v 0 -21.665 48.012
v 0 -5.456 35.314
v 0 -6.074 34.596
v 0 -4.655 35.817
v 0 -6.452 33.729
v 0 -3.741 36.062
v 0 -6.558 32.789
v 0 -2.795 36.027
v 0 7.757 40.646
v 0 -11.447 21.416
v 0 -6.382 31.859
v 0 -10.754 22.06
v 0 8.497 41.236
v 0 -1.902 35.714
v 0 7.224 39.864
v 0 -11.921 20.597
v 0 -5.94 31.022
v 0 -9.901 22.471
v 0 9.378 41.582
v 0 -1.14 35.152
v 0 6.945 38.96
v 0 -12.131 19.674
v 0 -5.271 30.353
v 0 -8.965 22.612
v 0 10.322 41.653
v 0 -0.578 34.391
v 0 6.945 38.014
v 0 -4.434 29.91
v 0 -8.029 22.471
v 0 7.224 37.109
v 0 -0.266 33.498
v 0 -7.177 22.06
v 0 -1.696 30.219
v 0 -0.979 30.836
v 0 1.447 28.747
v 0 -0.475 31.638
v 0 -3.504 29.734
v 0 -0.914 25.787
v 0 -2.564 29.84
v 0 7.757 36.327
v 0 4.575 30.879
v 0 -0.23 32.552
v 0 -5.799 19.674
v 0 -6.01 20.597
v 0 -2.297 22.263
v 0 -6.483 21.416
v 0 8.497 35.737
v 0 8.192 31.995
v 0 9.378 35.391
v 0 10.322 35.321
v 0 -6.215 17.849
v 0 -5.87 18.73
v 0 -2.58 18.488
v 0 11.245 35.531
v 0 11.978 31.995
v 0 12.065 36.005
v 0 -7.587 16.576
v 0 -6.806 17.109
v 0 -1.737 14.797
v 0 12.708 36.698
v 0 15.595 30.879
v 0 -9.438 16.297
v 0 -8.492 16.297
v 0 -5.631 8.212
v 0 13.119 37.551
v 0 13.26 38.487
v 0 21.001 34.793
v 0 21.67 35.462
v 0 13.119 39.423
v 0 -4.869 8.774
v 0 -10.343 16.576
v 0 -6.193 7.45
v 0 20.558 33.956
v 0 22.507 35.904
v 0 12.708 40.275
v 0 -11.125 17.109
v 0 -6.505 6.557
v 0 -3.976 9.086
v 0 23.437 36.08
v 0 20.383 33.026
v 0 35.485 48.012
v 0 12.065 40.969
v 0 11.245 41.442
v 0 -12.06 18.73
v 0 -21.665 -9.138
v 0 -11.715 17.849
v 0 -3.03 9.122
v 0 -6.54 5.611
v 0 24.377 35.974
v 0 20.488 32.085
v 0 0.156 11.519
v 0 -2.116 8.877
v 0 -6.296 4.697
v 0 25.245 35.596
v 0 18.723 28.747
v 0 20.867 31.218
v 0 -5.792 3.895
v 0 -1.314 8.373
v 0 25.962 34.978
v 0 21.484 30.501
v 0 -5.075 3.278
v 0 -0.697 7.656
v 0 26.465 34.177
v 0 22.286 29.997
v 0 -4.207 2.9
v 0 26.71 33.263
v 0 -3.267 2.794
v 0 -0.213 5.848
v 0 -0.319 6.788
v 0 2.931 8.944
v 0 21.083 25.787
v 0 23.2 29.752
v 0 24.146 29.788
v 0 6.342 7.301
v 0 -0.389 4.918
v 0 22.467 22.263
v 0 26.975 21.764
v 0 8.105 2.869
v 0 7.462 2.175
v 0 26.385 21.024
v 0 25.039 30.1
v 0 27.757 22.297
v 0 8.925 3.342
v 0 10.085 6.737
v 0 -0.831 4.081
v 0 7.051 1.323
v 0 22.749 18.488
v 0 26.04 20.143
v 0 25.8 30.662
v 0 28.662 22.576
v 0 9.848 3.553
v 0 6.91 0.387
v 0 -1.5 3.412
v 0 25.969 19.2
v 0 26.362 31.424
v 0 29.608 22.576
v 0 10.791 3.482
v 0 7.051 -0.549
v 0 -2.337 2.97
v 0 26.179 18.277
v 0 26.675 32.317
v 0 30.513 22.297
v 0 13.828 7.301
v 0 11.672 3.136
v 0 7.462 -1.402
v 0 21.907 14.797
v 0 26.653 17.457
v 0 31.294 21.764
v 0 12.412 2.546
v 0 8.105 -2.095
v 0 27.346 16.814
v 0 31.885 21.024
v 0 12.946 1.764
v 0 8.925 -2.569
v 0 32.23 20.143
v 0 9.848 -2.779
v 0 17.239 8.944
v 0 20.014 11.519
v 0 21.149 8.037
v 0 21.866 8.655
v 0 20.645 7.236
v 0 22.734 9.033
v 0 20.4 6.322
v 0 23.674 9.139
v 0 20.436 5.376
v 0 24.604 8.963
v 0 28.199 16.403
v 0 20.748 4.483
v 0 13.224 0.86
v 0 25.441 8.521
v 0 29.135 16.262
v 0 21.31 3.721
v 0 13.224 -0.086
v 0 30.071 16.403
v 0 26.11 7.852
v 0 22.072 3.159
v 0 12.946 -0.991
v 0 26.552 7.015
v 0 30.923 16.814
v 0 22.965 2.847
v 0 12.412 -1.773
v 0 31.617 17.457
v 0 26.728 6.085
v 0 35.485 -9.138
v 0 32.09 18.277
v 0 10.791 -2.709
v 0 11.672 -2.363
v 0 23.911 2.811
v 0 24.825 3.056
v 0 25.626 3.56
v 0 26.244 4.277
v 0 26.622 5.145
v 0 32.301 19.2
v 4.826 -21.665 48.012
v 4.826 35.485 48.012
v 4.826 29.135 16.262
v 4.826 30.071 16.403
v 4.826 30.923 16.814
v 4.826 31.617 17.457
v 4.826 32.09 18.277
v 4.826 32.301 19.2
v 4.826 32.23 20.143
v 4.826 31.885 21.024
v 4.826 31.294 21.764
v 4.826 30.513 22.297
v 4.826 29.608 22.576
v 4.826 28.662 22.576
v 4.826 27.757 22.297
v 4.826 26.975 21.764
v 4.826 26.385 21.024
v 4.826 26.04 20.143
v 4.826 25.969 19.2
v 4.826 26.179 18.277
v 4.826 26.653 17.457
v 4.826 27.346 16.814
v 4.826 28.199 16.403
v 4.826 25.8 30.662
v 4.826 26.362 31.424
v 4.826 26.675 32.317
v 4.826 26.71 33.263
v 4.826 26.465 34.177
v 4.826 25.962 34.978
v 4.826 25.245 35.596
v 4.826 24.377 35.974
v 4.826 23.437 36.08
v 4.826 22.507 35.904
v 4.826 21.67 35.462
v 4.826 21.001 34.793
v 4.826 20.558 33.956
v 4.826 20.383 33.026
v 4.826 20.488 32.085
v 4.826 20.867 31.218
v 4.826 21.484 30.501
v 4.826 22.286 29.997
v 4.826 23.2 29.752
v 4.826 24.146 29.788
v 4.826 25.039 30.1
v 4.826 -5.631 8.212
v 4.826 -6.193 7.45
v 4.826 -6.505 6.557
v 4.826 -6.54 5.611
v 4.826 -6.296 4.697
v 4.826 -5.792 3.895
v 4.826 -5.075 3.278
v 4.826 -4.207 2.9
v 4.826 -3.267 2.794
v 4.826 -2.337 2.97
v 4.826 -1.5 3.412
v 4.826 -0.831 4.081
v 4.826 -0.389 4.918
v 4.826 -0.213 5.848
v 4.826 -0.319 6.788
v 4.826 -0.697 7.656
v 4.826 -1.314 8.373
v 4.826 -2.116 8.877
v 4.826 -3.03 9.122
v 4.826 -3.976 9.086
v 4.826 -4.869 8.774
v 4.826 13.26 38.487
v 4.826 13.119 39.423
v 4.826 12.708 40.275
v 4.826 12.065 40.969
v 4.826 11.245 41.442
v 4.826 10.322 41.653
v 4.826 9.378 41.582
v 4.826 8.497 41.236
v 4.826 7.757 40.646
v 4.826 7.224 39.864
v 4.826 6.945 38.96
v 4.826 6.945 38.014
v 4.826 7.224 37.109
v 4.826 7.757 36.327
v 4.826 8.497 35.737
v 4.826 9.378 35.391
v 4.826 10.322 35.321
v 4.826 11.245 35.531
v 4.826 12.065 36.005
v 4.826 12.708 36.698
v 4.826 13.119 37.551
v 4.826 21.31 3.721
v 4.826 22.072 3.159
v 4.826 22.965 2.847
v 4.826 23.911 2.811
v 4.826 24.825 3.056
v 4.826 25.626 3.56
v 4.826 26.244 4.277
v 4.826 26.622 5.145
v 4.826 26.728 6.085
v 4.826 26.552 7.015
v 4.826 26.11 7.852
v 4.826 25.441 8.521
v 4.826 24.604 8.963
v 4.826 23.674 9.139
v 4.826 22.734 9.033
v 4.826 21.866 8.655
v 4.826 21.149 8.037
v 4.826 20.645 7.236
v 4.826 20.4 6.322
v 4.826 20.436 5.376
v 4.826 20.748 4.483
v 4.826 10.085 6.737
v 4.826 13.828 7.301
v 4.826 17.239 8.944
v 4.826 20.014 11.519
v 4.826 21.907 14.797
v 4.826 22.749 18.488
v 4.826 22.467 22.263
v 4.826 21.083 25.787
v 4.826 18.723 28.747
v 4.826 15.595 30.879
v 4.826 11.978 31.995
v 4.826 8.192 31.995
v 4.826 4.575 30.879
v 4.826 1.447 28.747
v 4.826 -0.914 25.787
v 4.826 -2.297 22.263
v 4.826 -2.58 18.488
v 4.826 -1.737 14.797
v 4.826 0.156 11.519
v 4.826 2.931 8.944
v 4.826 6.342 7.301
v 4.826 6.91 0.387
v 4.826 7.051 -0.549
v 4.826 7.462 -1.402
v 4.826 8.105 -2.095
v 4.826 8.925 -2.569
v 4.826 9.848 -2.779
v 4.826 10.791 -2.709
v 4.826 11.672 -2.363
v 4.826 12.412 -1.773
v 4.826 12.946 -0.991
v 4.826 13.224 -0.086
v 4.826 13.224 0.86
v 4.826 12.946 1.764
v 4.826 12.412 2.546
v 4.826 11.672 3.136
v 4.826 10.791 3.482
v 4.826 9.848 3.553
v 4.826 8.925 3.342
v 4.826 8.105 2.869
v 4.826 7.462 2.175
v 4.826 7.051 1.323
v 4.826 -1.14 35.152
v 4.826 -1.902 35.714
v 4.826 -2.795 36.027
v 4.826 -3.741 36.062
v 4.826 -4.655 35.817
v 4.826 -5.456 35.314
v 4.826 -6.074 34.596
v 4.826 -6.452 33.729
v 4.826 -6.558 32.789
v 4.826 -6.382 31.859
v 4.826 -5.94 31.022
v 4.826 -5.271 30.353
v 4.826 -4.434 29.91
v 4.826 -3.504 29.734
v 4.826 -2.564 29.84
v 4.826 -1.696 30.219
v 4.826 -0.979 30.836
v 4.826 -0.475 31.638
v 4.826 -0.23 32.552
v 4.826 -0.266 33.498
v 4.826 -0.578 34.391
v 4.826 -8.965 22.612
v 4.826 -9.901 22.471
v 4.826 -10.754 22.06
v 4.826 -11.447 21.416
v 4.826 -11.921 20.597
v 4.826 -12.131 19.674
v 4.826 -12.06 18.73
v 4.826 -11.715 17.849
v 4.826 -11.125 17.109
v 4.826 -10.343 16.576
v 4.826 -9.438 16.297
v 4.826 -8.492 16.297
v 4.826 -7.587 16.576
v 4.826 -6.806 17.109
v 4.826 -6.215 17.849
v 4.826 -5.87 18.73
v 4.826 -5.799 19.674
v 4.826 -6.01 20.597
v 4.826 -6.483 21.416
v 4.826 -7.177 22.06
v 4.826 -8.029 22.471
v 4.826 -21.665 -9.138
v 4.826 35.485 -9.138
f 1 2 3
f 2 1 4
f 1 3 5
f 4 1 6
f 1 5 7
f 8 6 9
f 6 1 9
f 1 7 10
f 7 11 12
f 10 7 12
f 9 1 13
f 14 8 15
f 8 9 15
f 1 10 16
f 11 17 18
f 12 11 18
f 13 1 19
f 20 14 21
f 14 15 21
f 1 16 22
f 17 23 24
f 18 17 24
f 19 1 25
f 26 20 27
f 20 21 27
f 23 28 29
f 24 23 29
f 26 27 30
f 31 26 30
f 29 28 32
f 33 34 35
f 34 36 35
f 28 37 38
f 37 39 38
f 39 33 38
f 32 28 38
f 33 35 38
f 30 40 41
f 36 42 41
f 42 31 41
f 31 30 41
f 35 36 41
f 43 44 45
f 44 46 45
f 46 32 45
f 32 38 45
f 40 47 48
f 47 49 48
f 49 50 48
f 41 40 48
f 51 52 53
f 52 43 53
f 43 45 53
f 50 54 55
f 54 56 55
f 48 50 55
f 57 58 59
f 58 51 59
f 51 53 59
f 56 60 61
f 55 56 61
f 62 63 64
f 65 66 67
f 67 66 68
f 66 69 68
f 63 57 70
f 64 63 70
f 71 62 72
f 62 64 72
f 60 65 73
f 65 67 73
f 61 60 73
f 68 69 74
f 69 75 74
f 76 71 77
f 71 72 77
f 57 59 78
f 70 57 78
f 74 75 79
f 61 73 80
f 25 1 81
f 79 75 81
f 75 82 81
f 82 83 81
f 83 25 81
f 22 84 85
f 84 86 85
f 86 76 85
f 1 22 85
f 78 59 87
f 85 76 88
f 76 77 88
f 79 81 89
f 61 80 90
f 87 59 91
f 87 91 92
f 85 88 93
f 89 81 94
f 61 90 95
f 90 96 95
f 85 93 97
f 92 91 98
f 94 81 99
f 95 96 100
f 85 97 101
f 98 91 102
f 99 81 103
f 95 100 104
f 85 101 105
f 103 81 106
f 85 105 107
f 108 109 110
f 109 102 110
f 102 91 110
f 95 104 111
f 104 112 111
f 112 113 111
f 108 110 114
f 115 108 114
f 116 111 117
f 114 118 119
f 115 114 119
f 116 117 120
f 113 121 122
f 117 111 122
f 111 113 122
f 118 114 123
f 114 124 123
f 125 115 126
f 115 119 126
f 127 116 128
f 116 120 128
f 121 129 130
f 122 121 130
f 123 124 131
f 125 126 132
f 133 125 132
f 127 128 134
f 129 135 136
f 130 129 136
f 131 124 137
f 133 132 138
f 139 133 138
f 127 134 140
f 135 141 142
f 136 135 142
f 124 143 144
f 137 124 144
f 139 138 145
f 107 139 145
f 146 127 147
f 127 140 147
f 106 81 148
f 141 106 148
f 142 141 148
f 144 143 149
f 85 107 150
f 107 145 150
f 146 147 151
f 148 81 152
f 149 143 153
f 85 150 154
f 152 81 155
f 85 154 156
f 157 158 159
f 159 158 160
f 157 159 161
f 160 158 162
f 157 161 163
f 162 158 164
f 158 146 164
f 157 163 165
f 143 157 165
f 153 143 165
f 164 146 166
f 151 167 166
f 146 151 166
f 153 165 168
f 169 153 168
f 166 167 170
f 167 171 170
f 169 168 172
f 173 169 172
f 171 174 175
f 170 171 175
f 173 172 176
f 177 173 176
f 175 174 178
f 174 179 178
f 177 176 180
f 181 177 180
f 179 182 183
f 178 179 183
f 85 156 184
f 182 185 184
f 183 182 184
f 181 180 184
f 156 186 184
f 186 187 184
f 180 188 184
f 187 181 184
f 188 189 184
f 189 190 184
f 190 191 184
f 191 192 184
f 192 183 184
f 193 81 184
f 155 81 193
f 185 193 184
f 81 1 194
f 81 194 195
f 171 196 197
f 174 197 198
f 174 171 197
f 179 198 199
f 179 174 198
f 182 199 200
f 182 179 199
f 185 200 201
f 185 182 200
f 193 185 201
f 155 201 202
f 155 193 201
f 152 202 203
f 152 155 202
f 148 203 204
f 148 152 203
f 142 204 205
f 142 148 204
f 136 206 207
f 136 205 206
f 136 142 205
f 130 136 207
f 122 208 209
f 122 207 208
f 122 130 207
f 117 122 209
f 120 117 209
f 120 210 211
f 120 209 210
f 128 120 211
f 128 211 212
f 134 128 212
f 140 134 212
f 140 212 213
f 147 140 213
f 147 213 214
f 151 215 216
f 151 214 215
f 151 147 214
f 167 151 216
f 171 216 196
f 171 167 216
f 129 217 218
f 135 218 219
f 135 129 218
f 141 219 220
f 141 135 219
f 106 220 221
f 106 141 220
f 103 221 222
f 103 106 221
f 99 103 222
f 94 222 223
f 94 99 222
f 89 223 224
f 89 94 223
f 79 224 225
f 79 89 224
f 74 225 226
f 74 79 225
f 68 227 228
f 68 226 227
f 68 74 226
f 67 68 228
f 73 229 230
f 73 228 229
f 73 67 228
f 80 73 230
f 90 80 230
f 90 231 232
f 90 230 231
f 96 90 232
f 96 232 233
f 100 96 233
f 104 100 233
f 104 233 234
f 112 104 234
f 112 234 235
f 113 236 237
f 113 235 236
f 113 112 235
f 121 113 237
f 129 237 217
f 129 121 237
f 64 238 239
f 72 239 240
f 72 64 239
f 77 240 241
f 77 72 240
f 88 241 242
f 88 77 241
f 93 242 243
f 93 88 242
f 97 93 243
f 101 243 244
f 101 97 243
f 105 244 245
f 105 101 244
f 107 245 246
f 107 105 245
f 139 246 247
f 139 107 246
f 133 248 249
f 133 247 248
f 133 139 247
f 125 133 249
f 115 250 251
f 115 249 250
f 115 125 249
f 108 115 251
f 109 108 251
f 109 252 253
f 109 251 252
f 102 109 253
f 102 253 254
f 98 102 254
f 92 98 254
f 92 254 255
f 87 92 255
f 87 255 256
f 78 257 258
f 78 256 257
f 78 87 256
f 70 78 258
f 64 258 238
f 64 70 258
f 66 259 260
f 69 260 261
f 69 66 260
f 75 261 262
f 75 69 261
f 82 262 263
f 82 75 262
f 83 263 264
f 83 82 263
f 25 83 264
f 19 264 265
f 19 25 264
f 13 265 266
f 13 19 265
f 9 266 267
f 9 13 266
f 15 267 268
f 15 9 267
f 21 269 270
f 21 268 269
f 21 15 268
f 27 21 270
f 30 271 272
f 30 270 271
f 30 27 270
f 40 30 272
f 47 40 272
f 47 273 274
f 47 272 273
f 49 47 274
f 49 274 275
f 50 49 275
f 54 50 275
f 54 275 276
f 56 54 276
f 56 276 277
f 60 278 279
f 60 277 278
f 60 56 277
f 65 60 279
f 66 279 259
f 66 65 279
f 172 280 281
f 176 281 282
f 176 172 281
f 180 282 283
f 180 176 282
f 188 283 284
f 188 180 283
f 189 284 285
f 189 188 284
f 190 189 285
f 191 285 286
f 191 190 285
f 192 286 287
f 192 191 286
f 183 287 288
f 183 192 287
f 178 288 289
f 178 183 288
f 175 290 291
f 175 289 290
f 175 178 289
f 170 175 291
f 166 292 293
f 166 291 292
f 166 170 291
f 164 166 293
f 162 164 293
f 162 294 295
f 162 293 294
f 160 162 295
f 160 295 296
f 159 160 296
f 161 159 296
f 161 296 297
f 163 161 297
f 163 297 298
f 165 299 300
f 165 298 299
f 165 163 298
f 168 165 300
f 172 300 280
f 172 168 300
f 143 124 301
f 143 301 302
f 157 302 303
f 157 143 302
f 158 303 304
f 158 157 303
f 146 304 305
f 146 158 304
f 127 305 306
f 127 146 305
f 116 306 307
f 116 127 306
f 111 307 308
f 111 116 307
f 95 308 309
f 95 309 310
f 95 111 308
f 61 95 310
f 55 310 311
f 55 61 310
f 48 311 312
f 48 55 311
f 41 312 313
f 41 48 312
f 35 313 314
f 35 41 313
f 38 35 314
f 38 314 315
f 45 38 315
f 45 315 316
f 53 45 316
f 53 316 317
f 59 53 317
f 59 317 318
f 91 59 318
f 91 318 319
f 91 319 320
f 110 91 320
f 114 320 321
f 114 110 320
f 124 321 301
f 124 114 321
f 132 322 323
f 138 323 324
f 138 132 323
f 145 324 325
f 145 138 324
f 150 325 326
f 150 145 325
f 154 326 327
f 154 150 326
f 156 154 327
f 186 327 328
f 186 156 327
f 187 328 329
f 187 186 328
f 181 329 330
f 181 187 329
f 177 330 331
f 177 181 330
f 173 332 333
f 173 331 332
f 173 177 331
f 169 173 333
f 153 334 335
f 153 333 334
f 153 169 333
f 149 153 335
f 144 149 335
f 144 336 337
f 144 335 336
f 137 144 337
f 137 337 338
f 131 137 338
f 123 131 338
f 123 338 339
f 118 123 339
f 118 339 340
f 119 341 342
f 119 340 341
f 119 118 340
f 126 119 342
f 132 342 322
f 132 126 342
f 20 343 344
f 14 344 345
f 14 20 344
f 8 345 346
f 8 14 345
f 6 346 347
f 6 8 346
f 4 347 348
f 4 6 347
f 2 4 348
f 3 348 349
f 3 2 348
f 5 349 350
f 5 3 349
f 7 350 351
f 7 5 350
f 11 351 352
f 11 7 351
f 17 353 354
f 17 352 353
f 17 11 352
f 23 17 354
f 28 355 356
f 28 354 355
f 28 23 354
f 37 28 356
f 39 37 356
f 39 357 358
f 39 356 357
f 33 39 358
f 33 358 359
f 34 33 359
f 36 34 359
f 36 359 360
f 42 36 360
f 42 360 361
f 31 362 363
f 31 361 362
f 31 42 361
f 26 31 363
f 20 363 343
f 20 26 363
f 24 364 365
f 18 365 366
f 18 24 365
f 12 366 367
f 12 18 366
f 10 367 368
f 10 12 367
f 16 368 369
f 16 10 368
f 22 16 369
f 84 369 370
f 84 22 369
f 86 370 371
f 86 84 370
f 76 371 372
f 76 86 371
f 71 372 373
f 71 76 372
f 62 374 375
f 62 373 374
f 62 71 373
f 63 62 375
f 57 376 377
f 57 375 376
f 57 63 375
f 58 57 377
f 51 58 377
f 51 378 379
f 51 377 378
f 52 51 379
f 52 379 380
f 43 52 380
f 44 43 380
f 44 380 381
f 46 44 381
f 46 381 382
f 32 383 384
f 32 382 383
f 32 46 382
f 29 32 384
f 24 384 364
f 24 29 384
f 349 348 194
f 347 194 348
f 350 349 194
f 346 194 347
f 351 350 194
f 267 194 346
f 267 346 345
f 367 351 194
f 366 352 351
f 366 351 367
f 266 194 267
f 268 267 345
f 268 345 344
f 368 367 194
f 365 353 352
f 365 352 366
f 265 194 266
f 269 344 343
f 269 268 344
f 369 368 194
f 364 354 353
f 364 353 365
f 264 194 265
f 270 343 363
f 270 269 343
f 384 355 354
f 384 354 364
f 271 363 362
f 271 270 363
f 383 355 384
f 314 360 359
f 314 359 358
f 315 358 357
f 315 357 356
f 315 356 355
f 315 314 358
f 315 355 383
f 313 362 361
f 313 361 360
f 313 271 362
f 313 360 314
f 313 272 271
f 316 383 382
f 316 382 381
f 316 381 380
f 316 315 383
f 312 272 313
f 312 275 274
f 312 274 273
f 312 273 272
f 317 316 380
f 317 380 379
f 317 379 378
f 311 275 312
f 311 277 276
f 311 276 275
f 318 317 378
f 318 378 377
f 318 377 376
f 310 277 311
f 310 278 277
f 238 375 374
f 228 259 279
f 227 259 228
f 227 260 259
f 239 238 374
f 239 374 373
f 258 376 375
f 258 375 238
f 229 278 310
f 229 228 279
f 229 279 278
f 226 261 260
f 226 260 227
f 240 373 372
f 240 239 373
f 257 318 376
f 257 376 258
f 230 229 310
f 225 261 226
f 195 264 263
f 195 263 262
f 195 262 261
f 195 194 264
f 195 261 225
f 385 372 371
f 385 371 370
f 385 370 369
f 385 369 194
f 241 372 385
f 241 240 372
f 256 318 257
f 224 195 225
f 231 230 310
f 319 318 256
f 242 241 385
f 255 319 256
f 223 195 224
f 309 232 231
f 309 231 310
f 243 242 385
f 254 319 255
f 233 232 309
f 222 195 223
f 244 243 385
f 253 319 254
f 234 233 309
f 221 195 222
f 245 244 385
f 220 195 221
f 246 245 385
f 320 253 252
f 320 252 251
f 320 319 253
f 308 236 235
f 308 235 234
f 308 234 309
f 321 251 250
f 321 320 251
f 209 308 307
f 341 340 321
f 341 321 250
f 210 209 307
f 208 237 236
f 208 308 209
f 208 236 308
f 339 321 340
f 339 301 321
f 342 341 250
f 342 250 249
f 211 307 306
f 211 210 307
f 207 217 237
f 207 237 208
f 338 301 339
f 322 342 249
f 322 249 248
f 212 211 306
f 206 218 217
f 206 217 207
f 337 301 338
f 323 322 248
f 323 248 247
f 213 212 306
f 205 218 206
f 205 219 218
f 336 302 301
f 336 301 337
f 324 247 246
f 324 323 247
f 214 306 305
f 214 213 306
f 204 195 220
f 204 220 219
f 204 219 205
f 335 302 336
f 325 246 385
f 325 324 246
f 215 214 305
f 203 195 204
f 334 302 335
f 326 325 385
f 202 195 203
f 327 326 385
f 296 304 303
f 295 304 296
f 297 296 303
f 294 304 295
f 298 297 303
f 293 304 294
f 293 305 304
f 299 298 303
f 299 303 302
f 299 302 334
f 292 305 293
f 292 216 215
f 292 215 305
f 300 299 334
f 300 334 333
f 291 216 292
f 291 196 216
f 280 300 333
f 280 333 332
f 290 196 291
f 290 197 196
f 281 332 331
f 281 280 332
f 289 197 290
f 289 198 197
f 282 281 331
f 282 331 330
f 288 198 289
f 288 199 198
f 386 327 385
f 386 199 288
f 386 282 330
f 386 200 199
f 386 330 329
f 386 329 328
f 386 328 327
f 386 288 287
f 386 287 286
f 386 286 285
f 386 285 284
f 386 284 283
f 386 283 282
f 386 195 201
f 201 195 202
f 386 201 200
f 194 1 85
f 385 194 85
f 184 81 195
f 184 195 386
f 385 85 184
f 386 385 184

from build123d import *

# Parameters (mm, degrees)
SKETCH2_W           = 57.15
SKETCH2_H           = 57.15
SKETCH2_R           = 12.7
BOSS_EXTRUDE2_DEPTH = 4.826
SKETCH2_4_R         = 3.175
CUT_EXTRUDE4_DEPTH  = 60.896656138
CIRPATTERN1_COUNT   = 8


with BuildPart() as part:
    # Sketch2 → Boss-Extrude2 (new body)
    with BuildSketch(Plane(origin=(0, 0, 0), x_dir=(0, 0, -1), z_dir=(1, 0, 0))):
        with Locations((-19.436862591, 6.909929069)):
            Rectangle(SKETCH2_W, SKETCH2_H)
        with Locations((-19.436862591, 10.084929069)):
            Circle(SKETCH2_R, mode=Mode.SUBTRACT)
    extrude(amount=BOSS_EXTRUDE2_DEPTH)

    # Sketch2<4> → Cut-Extrude4 (cut, through all)
    with BuildSketch(Plane(origin=(0, 0, 0), x_dir=(0, 0, -1), z_dir=(1, 0, 0))):
        with Locations((-19.436862591, 29.134929069)):
            Circle(SKETCH2_4_R)
    cut_extrude4 = extrude(amount=CUT_EXTRUDE4_DEPTH, mode=Mode.SUBTRACT)

    # CirPattern1: Cut-Extrude4 ×8 about axis
    cirpattern1_axis = Axis((4.826, 10.084929069, 19.436862591), (-1, 0, 0))
    for i in range(1, CIRPATTERN1_COUNT):
        add(cut_extrude4.rotate(cirpattern1_axis, i * 360 / CIRPATTERN1_COUNT), mode=Mode.SUBTRACT)


solid = part.part
